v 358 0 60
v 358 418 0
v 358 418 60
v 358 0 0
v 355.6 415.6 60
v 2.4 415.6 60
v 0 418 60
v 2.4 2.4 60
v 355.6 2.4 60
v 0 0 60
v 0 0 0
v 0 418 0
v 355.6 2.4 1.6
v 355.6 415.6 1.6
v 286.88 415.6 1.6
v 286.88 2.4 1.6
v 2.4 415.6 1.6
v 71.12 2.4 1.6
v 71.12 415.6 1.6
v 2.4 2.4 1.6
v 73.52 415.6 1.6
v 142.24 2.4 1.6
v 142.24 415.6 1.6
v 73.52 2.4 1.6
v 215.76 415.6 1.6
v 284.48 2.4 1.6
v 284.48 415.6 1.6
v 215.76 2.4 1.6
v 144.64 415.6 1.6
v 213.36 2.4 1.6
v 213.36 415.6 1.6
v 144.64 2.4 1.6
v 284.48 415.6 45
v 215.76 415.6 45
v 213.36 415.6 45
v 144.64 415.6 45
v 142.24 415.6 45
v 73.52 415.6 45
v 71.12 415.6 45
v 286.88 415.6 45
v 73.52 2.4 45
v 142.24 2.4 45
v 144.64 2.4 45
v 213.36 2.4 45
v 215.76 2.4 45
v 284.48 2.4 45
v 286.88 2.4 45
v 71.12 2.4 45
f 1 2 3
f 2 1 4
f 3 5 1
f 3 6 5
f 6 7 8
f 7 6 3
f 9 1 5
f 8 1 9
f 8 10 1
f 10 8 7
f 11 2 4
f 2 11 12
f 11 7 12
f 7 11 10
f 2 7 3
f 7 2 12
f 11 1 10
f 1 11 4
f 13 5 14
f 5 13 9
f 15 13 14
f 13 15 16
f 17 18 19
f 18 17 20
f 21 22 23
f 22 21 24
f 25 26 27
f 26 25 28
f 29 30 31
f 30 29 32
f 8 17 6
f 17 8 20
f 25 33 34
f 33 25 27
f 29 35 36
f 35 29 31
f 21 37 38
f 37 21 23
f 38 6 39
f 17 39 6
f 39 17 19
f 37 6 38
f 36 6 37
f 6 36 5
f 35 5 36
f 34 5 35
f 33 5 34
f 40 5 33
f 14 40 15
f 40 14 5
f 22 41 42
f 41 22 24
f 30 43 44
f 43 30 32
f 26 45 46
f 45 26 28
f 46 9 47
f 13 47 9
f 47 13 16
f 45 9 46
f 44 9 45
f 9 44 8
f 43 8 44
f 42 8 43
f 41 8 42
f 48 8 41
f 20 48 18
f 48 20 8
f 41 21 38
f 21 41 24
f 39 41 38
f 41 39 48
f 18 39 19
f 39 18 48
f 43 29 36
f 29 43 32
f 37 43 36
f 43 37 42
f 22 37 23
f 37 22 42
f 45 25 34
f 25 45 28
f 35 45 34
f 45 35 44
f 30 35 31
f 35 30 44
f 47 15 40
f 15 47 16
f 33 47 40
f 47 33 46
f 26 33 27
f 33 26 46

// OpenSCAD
// Drawer organiser — a parametric starter for Session 5.
// Change a number, press F5, and watch what moves.
// Every measurement is in millimetres.

/* [The drawer you measured] */
drawer_width  = 360;   // internal width          <- measured
drawer_depth  = 420;   // internal depth          <- measured
// ASSUMED, not measured. The clear height was measured at 75, and the sheet
// says leave 5 under the runner, which gives 70. This says 60. Nobody wrote
// down why. It is the one number in this file that cannot answer
// "where did that come from?" — decide for yourself whether to keep it.
usable_height = 60;    // how tall the organiser may be

/* [The organiser] */
wall          = 2.4;   // wall thickness: thin walls snap, thick walls waste space
compartments  = 5;     // number of cable compartments along the width
finger_gap    = 15;    // room to get a finger in and lift something out
floor_height  = 1.6;   // base thickness

/* [Fit] */
clearance     = 1.0;   // gap on each side so it actually slides in

// ---- derived: these follow from the numbers above, do not edit ----
outer_w = drawer_width - (clearance * 2);
outer_d = drawer_depth - (clearance * 2);
inner_w = outer_w - (wall * 2);
cell_w  = (inner_w - (wall * (compartments - 1))) / compartments;

echo(str("Outer size: ", outer_w, " x ", outer_d, " mm"));
echo(str("Each compartment: ", cell_w, " mm wide"));

module organiser() {
  difference() {
    // the outer shell
    cube([outer_w, outer_d, usable_height]);

    // hollow it out, leaving a floor
    translate([wall, wall, floor_height])
      cube([inner_w, outer_d - (wall * 2), usable_height]);
  }

  // the dividers
  for (i = [1 : compartments - 1]) {
    translate([wall + (i * cell_w) + ((i - 1) * wall), wall, floor_height])
      cube([wall, outer_d - (wall * 2), usable_height - floor_height - finger_gap]);
  }
}

organiser();
